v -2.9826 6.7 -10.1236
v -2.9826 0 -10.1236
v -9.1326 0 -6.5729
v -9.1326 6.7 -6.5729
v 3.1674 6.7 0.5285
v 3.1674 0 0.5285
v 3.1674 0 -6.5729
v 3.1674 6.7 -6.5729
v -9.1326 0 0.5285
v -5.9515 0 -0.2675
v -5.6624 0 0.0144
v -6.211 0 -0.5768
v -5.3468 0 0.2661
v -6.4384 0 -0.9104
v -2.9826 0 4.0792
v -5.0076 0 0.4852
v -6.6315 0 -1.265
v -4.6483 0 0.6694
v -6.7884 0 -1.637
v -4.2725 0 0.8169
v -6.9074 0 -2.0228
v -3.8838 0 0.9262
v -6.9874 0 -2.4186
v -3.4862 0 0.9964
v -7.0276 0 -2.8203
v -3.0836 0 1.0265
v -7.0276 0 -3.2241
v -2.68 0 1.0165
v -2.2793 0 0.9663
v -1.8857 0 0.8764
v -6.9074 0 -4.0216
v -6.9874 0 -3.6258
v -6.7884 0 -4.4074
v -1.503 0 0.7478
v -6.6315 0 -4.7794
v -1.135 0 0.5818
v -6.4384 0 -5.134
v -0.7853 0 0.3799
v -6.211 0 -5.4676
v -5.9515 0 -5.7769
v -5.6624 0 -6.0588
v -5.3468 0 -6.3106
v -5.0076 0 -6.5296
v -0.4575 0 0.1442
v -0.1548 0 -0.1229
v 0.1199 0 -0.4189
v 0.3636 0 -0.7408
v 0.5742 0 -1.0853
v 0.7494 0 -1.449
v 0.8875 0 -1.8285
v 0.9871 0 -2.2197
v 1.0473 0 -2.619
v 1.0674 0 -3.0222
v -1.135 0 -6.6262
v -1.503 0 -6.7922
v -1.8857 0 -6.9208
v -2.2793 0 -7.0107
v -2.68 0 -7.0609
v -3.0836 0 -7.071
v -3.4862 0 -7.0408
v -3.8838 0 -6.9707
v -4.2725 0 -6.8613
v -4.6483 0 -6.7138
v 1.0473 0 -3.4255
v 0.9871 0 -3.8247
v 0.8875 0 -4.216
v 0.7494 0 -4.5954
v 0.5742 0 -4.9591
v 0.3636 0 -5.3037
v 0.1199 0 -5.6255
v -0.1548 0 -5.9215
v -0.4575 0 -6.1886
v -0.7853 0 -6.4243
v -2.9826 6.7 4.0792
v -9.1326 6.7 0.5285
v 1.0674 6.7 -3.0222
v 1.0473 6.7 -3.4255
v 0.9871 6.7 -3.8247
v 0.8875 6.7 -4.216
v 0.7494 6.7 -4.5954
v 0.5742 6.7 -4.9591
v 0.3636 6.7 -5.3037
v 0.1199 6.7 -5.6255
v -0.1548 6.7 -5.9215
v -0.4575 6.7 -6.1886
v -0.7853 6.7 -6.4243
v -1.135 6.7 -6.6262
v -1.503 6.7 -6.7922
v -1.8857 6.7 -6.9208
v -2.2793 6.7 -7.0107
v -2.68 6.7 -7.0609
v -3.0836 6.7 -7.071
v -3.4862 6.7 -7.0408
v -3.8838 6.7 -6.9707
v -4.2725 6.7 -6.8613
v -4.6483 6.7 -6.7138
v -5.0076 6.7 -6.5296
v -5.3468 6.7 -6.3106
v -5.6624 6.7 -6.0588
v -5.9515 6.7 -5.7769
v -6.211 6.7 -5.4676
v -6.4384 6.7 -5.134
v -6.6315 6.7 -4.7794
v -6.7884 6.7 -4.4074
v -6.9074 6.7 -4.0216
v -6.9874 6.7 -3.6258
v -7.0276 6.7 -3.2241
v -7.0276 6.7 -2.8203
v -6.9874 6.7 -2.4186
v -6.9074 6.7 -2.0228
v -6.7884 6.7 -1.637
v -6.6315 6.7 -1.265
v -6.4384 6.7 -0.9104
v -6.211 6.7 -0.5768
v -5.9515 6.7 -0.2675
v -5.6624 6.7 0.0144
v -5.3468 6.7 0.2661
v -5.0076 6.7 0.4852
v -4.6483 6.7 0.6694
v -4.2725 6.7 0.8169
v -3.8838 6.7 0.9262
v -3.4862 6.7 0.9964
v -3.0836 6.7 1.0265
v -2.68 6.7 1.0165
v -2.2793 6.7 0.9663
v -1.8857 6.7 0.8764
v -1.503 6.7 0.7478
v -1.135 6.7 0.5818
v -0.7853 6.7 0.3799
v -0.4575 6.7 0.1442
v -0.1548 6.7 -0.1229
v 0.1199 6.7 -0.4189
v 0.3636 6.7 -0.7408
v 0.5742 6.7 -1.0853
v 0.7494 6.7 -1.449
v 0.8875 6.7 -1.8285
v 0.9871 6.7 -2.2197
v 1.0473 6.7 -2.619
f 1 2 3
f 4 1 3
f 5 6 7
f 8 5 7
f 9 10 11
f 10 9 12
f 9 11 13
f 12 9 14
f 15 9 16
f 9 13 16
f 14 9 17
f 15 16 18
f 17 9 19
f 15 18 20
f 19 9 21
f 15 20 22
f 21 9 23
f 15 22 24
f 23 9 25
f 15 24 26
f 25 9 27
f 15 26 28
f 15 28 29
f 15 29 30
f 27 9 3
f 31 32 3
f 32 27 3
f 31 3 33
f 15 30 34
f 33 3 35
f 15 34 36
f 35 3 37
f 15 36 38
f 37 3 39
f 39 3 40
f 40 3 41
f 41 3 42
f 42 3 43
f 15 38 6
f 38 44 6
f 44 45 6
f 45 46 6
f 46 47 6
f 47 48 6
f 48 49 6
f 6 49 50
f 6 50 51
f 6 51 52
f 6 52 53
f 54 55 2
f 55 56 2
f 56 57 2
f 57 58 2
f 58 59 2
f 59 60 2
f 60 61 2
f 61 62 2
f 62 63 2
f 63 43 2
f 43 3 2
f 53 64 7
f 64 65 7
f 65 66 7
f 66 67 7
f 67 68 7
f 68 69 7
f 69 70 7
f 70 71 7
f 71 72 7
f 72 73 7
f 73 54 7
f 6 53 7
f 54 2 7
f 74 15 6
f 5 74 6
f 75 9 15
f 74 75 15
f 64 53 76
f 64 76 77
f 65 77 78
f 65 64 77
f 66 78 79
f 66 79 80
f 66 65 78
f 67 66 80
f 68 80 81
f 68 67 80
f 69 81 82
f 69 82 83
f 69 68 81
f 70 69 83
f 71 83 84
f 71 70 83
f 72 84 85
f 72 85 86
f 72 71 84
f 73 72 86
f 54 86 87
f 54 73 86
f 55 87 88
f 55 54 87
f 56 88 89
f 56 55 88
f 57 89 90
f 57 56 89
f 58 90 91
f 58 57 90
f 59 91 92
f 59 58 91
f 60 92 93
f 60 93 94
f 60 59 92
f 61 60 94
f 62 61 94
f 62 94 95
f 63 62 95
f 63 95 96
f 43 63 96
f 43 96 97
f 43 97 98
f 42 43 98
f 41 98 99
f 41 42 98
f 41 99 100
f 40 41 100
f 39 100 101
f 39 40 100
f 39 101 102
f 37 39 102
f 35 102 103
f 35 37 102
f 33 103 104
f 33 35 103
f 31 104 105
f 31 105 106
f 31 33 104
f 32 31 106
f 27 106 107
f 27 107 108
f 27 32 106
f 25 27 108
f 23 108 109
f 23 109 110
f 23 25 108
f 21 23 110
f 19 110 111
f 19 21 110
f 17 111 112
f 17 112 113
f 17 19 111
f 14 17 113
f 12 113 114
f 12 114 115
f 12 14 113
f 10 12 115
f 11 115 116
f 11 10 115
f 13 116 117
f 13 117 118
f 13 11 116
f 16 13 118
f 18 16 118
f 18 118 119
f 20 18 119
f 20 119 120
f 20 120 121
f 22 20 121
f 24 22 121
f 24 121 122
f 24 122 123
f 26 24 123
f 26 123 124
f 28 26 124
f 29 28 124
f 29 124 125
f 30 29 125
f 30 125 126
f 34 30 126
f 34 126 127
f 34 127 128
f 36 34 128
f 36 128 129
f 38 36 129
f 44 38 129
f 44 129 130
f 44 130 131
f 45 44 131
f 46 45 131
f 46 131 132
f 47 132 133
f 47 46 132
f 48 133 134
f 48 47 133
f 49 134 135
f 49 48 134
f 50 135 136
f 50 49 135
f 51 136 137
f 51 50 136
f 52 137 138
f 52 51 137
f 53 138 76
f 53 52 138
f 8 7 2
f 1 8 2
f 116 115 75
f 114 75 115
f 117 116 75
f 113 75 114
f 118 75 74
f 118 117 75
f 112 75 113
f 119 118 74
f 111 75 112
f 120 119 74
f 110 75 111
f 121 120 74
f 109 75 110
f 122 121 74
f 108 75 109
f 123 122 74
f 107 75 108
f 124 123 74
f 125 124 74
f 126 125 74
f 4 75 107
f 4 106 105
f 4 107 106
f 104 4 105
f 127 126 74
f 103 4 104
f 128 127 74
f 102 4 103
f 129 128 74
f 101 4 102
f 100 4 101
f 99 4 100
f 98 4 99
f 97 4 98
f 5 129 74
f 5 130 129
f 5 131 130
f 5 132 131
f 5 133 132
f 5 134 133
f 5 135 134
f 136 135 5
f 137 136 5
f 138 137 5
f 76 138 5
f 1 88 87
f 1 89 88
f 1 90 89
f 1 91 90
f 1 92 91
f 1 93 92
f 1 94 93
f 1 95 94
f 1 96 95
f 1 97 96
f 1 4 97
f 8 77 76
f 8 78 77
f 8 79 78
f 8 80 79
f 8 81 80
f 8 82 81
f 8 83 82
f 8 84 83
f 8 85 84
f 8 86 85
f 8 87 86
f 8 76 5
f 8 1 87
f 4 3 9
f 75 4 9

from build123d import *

# Parameters (mm, degrees)
SKETCH1_R           = 4.05
BOSS_EXTRUDE1_DEPTH = 6.7


with BuildPart() as part:
    # Sketch1 → Boss-Extrude1 (new body)
    with BuildSketch(Plane(origin=(0, 0, 0), x_dir=(1, 0, 0), z_dir=(0, 1, 0))):
        Polygon((3.167381974, -0.528493855), (3.167381974, 6.572914456), (-2.982618026, 10.123618611), (-9.132618026, 6.572914456), (-9.132618026, -0.528493855), (-2.982618026, -4.079198011), align=None)
        with Locations((-2.982618026, 3.0222103)):
            Circle(SKETCH1_R, mode=Mode.SUBTRACT)
    extrude(amount=BOSS_EXTRUDE1_DEPTH)


solid = part.part
